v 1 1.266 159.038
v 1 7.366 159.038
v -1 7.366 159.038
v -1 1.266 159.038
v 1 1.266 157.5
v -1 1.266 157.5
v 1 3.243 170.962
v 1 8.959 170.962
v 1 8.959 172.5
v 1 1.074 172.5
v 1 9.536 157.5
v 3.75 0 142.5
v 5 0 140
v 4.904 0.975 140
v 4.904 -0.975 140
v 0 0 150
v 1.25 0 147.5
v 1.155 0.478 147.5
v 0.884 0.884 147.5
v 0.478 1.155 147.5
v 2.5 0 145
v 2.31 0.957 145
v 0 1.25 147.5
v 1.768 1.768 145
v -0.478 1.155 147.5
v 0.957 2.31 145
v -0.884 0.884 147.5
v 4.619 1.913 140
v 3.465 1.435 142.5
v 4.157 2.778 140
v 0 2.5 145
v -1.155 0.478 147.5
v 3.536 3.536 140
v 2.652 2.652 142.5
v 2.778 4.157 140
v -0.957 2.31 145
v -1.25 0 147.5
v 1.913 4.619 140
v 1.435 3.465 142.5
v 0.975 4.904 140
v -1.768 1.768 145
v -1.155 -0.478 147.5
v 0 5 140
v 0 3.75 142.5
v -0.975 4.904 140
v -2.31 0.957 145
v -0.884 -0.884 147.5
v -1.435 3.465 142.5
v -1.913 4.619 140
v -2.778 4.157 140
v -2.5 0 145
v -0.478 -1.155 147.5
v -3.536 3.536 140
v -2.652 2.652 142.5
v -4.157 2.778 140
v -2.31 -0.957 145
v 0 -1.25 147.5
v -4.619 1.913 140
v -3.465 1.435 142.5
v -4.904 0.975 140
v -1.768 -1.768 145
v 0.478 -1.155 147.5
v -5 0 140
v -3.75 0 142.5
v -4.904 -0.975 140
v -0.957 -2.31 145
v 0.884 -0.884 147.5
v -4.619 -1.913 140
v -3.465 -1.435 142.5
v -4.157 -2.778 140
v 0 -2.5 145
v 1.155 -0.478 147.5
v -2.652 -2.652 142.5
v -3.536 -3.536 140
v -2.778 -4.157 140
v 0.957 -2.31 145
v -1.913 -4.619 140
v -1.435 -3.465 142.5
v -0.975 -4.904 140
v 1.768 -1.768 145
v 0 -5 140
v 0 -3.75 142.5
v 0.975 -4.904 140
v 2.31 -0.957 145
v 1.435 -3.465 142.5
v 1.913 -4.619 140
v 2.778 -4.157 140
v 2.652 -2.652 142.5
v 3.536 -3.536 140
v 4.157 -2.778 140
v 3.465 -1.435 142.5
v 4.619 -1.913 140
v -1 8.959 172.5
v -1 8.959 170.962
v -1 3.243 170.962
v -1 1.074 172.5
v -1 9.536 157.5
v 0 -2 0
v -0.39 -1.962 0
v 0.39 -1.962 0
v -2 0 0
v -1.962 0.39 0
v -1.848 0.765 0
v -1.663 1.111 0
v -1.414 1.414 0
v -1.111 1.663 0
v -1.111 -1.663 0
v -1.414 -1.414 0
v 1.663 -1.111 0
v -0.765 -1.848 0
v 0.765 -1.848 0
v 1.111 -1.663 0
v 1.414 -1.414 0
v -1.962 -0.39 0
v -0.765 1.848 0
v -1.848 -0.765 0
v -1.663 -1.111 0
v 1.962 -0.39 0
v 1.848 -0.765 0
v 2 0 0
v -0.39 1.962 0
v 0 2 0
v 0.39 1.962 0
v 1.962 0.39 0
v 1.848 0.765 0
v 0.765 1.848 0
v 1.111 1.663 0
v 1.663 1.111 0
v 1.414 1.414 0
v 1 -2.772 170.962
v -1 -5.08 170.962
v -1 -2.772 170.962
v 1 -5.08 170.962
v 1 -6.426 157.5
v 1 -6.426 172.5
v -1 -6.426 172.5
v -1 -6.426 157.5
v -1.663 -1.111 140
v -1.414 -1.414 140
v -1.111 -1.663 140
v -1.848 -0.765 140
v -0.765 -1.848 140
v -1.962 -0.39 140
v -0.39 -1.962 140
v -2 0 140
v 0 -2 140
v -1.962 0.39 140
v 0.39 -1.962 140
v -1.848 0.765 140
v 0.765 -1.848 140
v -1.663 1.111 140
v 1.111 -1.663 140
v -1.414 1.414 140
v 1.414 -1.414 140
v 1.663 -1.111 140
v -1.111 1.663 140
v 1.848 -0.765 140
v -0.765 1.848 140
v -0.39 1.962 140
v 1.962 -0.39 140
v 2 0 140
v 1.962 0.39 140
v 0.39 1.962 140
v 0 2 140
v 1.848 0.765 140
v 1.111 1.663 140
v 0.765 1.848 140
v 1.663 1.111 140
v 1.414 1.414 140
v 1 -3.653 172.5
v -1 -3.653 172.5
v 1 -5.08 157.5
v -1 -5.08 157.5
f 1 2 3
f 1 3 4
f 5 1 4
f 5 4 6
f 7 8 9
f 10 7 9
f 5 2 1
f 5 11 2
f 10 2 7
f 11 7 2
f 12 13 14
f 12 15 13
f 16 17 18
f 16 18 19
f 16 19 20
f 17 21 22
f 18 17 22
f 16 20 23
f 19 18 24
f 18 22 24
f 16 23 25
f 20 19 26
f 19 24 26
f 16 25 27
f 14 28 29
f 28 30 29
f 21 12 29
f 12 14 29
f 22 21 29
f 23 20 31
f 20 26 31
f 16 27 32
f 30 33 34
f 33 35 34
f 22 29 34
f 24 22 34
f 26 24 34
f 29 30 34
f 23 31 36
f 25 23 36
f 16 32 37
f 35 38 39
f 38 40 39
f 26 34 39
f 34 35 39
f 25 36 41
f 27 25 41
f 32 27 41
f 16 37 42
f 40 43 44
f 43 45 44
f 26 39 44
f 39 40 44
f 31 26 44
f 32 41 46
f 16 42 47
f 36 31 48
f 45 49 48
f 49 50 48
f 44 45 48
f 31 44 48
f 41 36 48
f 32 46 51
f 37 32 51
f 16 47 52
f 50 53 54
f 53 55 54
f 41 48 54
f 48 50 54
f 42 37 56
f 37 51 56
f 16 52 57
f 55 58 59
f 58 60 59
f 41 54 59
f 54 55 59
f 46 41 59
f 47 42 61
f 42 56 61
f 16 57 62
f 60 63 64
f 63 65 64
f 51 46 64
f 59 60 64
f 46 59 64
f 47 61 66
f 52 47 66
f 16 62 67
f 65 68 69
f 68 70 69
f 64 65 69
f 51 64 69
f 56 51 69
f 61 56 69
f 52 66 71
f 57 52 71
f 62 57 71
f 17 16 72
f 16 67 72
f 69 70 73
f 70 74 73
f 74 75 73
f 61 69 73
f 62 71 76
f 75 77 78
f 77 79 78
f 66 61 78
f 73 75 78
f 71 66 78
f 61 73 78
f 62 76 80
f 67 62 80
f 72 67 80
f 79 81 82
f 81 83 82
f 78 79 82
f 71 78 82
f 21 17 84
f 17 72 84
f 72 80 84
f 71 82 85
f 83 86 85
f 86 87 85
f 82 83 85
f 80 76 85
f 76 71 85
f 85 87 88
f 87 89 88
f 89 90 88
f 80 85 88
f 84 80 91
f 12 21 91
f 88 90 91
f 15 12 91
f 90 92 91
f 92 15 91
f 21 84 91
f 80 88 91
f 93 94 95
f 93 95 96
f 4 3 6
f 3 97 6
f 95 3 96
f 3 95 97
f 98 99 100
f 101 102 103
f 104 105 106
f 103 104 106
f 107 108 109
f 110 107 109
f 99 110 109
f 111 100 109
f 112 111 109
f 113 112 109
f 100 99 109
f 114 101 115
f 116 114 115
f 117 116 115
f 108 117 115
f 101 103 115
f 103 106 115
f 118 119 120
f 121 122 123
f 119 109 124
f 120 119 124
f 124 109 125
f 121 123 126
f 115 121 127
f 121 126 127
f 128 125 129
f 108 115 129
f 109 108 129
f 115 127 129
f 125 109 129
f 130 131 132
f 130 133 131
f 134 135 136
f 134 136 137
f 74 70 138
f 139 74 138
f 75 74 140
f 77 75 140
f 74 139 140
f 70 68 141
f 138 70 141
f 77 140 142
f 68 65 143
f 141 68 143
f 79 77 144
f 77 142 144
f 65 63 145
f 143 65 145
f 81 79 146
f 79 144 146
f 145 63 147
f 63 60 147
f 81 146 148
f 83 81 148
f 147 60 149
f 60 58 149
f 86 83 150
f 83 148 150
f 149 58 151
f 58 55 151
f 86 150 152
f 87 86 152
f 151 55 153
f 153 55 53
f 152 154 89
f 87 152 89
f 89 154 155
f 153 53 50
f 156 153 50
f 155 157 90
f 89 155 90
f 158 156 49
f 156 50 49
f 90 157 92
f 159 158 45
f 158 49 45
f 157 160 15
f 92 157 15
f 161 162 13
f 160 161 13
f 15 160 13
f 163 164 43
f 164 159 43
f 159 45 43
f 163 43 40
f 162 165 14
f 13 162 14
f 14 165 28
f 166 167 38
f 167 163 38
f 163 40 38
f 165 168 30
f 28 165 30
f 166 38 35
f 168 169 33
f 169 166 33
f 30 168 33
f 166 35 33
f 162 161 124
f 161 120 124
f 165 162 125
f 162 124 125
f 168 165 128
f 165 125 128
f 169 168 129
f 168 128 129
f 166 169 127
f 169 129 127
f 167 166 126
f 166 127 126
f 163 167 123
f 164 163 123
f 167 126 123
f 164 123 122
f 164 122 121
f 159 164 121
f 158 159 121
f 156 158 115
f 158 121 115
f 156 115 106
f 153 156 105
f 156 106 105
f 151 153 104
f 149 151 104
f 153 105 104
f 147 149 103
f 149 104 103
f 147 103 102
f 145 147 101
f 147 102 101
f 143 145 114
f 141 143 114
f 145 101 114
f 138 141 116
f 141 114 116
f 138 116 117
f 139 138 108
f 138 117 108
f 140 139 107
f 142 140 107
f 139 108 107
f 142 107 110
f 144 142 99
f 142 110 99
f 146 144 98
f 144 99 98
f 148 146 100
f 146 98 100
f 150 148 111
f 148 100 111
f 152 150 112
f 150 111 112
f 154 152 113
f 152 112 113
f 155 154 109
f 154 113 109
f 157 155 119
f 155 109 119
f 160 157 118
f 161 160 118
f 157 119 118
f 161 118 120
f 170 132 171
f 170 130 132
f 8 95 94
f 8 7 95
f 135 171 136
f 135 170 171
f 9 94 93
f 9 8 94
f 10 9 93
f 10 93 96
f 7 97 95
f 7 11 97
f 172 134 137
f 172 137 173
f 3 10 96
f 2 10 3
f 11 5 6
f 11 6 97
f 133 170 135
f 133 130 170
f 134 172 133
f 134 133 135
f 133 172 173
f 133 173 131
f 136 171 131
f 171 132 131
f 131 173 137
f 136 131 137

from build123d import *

# Parameters (mm, degrees)
BOSS_EXTRUDE1_DEPTH        = 1
BOSS_EXTRUDE1_DEPTH_BACK   = 1
BOSS_EXTRUDE1_2_DEPTH      = 1
BOSS_EXTRUDE1_2_DEPTH_BACK = 1


with BuildPart() as part:
    # Sketch2 → Revolve1 (revolve)
    with BuildSketch(Plane(origin=(0, 0, 0), x_dir=(1, 0, 0), z_dir=(0, 1, 0))):
        Polygon((0, -150), (5, -140), (2, -140), (2, 0), (0, 0), align=None)
    revolve(axis=Axis((0, 0, -41.949952025), (0, 0, 1)))


with BuildPart() as body_2:
    # Sketch3 → Boss-Extrude1 (new, two sides: drawn at the far end of the back side and taken through both)
    with BuildSketch(Plane(origin=(0, 0, 0), x_dir=(0, -1, 0), z_dir=(1, 0, 0)).offset(-BOSS_EXTRUDE1_DEPTH_BACK)):
        Polygon((-8.958586521, -170.961538462), (-8.958586521, -172.5), (-1.073971137, -172.5), (-7.366038444, -159.038461538), (-1.266278829, -159.038461538), (-1.266278829, -157.5), (-9.535509598, -157.5), (-3.243442291, -170.961538462), align=None)
    extrude(amount=BOSS_EXTRUDE1_DEPTH + BOSS_EXTRUDE1_DEPTH_BACK)


with BuildPart() as body_3:
    # Sketch3 → Boss-Extrude1 2 (new, two sides: drawn at the far end of the back side and taken through both)
    with BuildSketch(Plane(origin=(0, 0, 0), x_dir=(0, -1, 0), z_dir=(1, 0, 0)).offset(-BOSS_EXTRUDE1_2_DEPTH_BACK)):
        Polygon((3.652591363, -172.5), (6.426028863, -172.5), (6.426028863, -157.5), (5.079875017, -157.5), (5.079875017, -170.961538462), (2.772182709, -170.961538462), align=None)
    extrude(amount=BOSS_EXTRUDE1_2_DEPTH + BOSS_EXTRUDE1_2_DEPTH_BACK)


solid = Compound([part.part, body_2.part, body_3.part])
